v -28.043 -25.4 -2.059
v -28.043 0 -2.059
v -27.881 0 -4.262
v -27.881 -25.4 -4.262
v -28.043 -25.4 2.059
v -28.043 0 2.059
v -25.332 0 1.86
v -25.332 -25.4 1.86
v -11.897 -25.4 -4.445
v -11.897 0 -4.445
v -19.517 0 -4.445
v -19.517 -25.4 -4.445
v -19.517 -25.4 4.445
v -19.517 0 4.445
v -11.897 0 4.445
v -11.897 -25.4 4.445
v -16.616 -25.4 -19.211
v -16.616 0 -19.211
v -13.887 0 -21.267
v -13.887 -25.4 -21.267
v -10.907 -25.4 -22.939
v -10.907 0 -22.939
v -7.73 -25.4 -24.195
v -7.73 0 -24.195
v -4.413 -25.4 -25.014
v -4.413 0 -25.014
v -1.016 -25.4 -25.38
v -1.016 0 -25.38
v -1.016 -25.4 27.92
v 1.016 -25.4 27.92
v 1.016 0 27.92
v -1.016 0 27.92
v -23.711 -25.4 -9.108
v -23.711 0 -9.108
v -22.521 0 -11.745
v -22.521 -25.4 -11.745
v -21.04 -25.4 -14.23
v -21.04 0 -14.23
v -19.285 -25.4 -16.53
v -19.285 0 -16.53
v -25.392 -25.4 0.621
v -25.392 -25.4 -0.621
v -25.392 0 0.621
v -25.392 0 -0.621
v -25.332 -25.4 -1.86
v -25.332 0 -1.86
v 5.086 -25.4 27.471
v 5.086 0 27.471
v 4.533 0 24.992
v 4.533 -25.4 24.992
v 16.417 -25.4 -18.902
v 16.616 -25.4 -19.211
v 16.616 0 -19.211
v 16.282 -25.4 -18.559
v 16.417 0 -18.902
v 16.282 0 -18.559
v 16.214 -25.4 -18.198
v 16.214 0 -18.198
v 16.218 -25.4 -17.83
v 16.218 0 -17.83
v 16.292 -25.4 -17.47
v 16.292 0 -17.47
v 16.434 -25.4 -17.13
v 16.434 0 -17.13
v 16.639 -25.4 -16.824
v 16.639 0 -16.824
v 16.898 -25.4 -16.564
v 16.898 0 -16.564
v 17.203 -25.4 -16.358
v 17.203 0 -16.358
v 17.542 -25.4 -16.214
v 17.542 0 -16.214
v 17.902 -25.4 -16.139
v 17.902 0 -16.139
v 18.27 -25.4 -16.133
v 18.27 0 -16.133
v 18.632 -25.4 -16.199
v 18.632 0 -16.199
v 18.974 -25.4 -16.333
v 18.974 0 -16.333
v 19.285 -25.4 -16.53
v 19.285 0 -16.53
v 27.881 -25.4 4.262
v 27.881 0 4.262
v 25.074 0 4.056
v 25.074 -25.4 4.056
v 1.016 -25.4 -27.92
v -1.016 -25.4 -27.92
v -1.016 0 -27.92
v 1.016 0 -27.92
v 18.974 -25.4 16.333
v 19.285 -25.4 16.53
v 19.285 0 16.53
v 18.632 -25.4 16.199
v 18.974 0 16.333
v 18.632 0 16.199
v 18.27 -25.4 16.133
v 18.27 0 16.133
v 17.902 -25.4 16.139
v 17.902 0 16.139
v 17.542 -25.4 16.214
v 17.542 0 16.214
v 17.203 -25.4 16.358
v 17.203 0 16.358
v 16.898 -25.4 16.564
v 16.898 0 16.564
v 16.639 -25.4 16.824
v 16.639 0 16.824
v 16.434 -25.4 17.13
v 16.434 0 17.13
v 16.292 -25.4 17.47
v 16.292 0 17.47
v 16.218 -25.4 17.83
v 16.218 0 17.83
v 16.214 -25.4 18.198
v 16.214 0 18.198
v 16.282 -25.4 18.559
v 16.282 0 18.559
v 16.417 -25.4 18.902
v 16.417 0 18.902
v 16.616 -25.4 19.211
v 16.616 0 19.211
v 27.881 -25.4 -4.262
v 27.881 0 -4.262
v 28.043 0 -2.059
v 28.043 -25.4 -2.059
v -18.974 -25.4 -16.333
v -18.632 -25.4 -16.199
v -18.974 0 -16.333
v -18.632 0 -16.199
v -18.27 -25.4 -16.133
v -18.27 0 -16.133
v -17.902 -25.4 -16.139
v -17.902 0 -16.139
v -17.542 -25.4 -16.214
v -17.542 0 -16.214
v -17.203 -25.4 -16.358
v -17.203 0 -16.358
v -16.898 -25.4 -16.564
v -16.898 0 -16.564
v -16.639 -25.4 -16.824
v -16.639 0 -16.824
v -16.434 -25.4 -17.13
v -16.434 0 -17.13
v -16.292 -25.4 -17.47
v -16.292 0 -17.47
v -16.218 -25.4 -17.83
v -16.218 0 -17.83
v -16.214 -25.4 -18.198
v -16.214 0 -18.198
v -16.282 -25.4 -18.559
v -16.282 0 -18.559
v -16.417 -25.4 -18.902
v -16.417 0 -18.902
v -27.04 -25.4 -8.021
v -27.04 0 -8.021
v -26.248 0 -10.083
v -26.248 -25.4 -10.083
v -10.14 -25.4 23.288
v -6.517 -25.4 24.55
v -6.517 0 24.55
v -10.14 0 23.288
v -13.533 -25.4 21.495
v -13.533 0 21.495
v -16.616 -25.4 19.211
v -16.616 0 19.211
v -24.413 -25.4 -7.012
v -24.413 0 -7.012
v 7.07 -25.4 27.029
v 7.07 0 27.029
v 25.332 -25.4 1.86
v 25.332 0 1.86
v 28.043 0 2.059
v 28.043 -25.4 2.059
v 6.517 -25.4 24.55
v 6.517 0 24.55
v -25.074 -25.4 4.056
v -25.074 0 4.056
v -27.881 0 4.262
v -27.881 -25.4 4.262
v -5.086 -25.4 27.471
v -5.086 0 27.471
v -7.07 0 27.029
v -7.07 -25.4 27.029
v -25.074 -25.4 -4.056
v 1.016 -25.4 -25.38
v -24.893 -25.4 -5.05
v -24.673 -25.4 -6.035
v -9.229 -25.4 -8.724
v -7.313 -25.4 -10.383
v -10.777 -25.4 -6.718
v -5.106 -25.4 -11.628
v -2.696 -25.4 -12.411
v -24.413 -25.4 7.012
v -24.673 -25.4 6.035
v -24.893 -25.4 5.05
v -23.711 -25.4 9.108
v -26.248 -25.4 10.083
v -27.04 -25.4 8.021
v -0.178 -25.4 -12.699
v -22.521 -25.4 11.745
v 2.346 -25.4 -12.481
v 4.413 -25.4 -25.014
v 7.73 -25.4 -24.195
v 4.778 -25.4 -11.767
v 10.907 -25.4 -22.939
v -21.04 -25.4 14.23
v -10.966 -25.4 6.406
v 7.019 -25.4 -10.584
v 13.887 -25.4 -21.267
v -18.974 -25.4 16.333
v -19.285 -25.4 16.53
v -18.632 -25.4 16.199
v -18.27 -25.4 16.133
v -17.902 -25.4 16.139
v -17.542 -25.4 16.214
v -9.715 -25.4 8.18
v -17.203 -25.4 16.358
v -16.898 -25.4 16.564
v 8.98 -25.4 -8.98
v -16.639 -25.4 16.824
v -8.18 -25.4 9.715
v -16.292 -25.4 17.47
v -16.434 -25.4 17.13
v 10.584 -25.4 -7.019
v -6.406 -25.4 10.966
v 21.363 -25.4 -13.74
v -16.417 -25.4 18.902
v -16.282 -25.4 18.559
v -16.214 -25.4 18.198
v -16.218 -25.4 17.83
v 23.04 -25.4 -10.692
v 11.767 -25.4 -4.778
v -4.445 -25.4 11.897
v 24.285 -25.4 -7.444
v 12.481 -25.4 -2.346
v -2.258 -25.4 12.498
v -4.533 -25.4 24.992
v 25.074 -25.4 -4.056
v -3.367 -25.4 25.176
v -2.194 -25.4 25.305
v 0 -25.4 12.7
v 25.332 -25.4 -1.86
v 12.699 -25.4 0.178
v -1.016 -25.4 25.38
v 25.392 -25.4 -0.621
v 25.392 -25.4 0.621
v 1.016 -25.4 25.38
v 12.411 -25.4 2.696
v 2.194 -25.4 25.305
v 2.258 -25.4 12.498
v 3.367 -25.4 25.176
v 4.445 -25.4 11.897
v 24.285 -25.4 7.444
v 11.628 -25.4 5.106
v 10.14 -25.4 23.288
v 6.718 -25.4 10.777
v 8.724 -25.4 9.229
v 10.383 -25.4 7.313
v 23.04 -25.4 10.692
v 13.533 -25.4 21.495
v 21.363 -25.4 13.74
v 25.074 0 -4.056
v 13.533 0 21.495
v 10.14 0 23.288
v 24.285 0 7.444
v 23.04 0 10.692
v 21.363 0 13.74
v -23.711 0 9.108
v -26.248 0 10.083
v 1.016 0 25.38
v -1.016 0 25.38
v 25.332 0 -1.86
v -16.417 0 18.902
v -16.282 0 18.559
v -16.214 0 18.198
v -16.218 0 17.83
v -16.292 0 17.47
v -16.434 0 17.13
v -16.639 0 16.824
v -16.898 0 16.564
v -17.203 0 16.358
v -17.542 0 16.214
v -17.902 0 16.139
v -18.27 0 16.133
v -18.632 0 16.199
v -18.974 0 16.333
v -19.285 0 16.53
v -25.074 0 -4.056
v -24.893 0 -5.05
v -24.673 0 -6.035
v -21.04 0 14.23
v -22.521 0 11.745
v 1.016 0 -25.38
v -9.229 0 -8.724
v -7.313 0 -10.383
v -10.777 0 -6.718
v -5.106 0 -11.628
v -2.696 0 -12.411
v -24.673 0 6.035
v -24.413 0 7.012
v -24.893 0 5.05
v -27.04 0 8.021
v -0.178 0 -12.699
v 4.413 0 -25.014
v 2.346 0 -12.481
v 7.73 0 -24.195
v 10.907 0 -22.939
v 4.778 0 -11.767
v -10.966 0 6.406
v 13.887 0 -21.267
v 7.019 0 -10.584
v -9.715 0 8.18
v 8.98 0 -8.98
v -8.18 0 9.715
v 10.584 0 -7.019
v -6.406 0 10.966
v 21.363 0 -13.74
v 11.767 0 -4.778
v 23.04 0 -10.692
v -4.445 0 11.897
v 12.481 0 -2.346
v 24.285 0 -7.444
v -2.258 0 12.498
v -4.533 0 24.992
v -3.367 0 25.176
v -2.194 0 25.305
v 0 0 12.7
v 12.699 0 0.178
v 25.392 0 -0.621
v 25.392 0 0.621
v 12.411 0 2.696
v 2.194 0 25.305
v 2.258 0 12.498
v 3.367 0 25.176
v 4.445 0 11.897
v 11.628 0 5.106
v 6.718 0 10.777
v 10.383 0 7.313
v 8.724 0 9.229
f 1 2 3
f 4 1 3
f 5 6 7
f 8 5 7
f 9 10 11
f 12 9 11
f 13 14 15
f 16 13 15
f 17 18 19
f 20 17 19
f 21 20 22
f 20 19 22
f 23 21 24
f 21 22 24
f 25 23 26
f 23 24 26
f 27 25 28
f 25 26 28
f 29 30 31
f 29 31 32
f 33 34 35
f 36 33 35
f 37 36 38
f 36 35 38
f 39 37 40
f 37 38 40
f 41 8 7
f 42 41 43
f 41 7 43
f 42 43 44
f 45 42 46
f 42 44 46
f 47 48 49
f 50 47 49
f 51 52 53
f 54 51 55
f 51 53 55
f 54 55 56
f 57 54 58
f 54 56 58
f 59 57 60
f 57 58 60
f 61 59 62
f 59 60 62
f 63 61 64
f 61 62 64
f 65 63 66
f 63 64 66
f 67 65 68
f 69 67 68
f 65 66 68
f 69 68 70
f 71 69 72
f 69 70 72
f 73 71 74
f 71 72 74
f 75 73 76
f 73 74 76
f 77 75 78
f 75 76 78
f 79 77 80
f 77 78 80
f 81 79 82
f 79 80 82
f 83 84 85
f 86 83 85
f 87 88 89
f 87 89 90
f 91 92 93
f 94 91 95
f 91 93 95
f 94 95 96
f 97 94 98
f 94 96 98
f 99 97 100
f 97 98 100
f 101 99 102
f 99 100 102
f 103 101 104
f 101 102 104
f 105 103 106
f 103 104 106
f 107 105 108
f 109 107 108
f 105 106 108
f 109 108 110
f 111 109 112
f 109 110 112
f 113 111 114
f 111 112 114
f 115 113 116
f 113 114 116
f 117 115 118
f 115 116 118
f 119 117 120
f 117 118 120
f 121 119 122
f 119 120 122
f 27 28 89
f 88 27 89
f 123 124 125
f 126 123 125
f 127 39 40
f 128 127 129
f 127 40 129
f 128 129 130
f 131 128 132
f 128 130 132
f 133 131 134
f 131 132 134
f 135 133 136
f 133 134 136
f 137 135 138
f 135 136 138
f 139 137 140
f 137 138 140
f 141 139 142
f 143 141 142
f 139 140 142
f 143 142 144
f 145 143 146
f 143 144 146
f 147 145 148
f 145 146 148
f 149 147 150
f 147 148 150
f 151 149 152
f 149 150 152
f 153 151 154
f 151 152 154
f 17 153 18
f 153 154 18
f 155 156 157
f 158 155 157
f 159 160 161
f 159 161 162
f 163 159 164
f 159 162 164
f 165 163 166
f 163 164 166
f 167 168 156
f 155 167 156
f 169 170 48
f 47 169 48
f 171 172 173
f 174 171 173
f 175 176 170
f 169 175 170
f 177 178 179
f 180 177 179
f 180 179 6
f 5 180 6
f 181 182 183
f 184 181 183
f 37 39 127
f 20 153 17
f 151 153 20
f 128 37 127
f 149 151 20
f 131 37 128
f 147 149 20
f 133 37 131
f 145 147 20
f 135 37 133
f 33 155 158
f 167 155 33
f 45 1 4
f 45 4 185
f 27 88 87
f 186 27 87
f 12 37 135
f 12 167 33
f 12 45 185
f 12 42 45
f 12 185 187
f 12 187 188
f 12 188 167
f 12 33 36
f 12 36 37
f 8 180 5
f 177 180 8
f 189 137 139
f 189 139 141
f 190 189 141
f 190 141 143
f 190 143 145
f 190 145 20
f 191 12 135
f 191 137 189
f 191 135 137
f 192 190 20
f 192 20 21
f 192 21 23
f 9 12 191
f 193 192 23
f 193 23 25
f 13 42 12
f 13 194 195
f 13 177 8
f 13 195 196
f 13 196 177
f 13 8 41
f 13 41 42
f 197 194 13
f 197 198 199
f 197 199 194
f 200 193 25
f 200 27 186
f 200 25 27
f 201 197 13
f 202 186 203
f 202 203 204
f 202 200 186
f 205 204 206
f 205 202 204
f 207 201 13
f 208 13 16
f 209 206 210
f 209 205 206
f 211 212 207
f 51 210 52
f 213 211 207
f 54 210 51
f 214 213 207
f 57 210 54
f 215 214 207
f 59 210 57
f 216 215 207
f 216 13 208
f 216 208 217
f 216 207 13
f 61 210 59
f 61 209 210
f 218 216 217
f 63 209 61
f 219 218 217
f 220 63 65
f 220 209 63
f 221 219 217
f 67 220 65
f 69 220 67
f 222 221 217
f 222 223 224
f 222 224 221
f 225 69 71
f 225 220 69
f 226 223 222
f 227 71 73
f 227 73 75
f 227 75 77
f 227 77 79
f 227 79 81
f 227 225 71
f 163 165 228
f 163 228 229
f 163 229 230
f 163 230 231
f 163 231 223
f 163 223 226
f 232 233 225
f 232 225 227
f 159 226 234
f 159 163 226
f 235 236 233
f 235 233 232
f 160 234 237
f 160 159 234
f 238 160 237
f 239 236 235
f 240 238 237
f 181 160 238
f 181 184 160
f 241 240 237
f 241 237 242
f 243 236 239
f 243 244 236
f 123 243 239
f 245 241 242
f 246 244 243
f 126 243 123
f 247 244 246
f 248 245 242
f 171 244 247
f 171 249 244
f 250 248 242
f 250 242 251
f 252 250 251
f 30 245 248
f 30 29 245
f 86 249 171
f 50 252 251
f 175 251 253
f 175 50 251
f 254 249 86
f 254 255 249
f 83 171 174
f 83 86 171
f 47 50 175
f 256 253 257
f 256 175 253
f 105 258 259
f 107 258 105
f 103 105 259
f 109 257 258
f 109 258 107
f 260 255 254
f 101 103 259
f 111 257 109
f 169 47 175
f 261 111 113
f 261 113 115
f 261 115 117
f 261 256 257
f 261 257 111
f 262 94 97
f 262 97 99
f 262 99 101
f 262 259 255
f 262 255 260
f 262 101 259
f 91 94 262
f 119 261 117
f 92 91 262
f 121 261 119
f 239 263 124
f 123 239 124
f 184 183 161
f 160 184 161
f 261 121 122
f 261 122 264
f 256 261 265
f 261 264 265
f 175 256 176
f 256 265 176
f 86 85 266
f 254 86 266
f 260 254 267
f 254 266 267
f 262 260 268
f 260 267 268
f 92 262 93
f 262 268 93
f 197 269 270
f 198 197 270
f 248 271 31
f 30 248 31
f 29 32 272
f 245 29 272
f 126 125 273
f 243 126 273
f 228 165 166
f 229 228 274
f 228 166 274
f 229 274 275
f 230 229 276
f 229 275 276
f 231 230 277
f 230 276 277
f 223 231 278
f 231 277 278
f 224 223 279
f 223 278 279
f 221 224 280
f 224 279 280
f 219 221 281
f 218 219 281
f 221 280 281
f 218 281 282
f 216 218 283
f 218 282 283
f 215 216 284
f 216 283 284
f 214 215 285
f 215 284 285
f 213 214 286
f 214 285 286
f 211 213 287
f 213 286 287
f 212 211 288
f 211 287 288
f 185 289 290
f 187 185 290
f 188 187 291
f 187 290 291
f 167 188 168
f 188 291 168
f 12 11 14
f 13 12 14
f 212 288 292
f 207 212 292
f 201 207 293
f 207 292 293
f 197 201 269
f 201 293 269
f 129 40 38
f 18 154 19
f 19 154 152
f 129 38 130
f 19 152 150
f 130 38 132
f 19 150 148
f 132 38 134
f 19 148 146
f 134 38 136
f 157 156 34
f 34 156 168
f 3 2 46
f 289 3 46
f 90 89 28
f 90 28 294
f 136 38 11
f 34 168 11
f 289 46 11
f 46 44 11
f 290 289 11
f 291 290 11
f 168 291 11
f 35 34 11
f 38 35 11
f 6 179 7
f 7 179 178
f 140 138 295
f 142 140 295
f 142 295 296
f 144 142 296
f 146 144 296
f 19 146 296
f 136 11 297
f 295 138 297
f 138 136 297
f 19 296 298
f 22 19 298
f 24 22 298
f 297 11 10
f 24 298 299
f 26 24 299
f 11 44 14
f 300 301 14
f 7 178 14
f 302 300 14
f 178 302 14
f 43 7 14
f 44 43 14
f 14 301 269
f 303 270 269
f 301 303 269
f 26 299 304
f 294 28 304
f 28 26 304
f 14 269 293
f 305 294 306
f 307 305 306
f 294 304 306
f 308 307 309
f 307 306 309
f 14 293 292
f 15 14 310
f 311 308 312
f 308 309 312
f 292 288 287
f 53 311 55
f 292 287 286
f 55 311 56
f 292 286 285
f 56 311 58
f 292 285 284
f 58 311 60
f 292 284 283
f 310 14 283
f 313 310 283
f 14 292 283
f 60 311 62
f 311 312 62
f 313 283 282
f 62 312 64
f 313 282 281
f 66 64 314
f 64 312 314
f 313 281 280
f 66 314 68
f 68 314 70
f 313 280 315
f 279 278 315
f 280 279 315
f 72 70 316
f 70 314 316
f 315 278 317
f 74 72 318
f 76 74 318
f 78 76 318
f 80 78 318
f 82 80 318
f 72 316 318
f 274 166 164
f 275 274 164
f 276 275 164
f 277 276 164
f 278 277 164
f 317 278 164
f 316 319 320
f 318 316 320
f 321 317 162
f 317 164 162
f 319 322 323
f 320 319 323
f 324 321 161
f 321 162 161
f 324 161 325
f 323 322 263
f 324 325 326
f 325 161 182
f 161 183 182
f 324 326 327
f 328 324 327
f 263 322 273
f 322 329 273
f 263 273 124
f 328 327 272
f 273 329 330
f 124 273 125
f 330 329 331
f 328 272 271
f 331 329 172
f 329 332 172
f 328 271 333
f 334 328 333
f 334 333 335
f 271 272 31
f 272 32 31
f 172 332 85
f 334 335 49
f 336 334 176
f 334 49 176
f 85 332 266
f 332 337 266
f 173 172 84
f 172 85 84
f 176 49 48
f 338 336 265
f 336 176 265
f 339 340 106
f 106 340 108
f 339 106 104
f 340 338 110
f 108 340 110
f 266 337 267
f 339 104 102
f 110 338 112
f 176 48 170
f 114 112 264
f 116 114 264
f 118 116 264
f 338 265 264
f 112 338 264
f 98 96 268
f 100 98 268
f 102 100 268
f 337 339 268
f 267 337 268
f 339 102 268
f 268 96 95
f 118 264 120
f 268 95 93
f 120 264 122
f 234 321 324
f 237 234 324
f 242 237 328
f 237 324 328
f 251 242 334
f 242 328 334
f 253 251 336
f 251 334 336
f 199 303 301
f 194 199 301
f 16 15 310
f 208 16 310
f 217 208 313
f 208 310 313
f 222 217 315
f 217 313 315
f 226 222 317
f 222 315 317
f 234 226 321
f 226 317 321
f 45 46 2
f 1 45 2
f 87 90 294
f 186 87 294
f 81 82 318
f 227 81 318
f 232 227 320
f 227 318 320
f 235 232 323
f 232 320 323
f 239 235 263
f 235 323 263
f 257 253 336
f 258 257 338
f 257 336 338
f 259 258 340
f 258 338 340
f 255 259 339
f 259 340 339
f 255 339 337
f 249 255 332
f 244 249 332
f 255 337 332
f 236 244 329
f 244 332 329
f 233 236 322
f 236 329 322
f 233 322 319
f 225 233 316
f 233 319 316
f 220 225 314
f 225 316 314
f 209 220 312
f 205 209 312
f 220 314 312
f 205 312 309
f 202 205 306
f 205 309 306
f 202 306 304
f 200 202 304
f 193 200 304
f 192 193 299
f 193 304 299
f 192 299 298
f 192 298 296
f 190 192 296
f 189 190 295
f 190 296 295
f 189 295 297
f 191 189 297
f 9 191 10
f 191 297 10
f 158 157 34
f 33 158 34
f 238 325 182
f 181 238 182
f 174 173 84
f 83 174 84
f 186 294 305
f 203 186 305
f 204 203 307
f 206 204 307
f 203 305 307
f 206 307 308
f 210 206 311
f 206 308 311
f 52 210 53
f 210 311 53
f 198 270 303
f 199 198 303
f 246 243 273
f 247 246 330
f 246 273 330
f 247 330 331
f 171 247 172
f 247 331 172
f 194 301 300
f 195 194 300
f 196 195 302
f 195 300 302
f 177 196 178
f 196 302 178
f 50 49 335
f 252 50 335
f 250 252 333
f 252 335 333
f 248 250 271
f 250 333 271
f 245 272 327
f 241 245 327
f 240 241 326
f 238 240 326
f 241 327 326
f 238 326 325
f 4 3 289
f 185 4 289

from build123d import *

# Parameters (mm, degrees)
F1_DEPTH = 25.4


with BuildPart() as f1:
    # F0 (on Front) → F1 (new body)
    with BuildSketch(Plane.XZ):
        with BuildLine():
            ThreePointArc((19.284791, 16.530482), (16.762226, 16.687837), (16.616092, 19.211078))
            ThreePointArc((16.616092, 19.211078), (11.870376, 22.455605), (6.516592, 24.549828))
            Line((6.516592, 24.549828), (7.06953, 27.028912))
            Line((7.06953, 27.028912), (5.086263, 27.471263))
            Line((5.086263, 27.471263), (4.533324, 24.992178))
            ThreePointArc((4.533324, 24.992178), (2.781418, 25.247252), (1.016, 25.379672))
            Line((1.016, 25.379672), (1.016, 27.919672))
            Line((1.016, 27.919672), (-1.016, 27.919672))
            Line((-1.016, 27.919672), (-1.016, 25.379672))
            ThreePointArc((-1.016, 25.379672), (-2.781418, 25.247252), (-4.533324, 24.992178))
            Line((-4.533324, 24.992178), (-5.086263, 27.471263))
            Line((-5.086263, 27.471263), (-7.06953, 27.028912))
            Line((-7.06953, 27.028912), (-6.516592, 24.549828))
            ThreePointArc((-6.516592, 24.549828), (-11.870376, 22.455605), (-16.616092, 19.211078))
            ThreePointArc((-16.616092, 19.211078), (-16.762226, 16.687837), (-19.284791, 16.530482))
            ThreePointArc((-19.284791, 16.530482), (-21.815816, 13.00885), (-23.710856, 9.107979))
            Line((-23.710856, 9.107979), (-26.248305, 10.082682))
            Line((-26.248305, 10.082682), (-27.040335, 8.020787))
            Line((-27.040335, 8.020787), (-24.413065, 7.011581))
            ThreePointArc((-24.413065, 7.011581), (-24.787675, 5.543569), (-25.074094, 4.055834))
            Line((-25.074094, 4.055834), (-27.880973, 4.261933))
            Line((-27.880973, 4.261933), (-28.042721, 2.059081))
            Line((-28.042721, 2.059081), (-25.331804, 1.860028))
            ThreePointArc((-25.331804, 1.860028), (-25.4, 0), (-25.331804, -1.860028))
            Line((-25.331804, -1.860028), (-28.042721, -2.059081))
            Line((-28.042721, -2.059081), (-27.880973, -4.261933))
            Line((-27.880973, -4.261933), (-25.074094, -4.055834))
            ThreePointArc((-25.074094, -4.055834), (-24.787675, -5.543569), (-24.413065, -7.011581))
            Line((-24.413065, -7.011581), (-27.040335, -8.020787))
            Line((-27.040335, -8.020787), (-26.248305, -10.082682))
            Line((-26.248305, -10.082682), (-23.710856, -9.107979))
            ThreePointArc((-23.710856, -9.107979), (-21.815816, -13.00885), (-19.284791, -16.530482))
            ThreePointArc((-19.284791, -16.530482), (-16.762226, -16.687837), (-16.616092, -19.211078))
            ThreePointArc((-16.616092, -19.211078), (-9.339997, -23.620424), (-1.016, -25.379672))
            Line((-1.016, -25.379672), (-1.016, -27.919672))
            Line((-1.016, -27.919672), (1.016, -27.919672))
            Line((1.016, -27.919672), (1.016, -25.379672))
            ThreePointArc((1.016, -25.379672), (9.339997, -23.620424), (16.616092, -19.211078))
            ThreePointArc((16.616092, -19.211078), (16.762226, -16.687837), (19.284791, -16.530482))
            ThreePointArc((19.284791, -16.530482), (23.039789, -10.692432), (25.074094, -4.055834))
            Line((25.074094, -4.055834), (27.880973, -4.261933))
            Line((27.880973, -4.261933), (28.042721, -2.059081))
            Line((28.042721, -2.059081), (25.331804, -1.860028))
            ThreePointArc((25.331804, -1.860028), (25.4, 0), (25.331804, 1.860028))
            Line((25.331804, 1.860028), (28.042721, 2.059081))
            Line((28.042721, 2.059081), (27.880973, 4.261933))
            Line((27.880973, 4.261933), (25.074094, 4.055834))
            ThreePointArc((25.074094, 4.055834), (23.039789, 10.692432), (19.284791, 16.530482))
        make_face()
        with BuildLine():
            ThreePointArc((-11.896721, 4.445), (-8.980256, 8.980256), (-4.445, 11.896721))
            ThreePointArc((-4.445, 11.896721), (0, 12.7), (4.445, 11.896721))
            ThreePointArc((4.445, 11.896721), (8.980256, -8.980256), (-11.896721, -4.445))
            Line((-11.896721, -4.445), (-19.516721, -4.445))
            Line((-19.516721, -4.445), (-19.516721, 4.445))
            Line((-19.516721, 4.445), (-11.896721, 4.445))
        make_face(mode=Mode.SUBTRACT)
    extrude(amount=F1_DEPTH)


solid = f1.part
